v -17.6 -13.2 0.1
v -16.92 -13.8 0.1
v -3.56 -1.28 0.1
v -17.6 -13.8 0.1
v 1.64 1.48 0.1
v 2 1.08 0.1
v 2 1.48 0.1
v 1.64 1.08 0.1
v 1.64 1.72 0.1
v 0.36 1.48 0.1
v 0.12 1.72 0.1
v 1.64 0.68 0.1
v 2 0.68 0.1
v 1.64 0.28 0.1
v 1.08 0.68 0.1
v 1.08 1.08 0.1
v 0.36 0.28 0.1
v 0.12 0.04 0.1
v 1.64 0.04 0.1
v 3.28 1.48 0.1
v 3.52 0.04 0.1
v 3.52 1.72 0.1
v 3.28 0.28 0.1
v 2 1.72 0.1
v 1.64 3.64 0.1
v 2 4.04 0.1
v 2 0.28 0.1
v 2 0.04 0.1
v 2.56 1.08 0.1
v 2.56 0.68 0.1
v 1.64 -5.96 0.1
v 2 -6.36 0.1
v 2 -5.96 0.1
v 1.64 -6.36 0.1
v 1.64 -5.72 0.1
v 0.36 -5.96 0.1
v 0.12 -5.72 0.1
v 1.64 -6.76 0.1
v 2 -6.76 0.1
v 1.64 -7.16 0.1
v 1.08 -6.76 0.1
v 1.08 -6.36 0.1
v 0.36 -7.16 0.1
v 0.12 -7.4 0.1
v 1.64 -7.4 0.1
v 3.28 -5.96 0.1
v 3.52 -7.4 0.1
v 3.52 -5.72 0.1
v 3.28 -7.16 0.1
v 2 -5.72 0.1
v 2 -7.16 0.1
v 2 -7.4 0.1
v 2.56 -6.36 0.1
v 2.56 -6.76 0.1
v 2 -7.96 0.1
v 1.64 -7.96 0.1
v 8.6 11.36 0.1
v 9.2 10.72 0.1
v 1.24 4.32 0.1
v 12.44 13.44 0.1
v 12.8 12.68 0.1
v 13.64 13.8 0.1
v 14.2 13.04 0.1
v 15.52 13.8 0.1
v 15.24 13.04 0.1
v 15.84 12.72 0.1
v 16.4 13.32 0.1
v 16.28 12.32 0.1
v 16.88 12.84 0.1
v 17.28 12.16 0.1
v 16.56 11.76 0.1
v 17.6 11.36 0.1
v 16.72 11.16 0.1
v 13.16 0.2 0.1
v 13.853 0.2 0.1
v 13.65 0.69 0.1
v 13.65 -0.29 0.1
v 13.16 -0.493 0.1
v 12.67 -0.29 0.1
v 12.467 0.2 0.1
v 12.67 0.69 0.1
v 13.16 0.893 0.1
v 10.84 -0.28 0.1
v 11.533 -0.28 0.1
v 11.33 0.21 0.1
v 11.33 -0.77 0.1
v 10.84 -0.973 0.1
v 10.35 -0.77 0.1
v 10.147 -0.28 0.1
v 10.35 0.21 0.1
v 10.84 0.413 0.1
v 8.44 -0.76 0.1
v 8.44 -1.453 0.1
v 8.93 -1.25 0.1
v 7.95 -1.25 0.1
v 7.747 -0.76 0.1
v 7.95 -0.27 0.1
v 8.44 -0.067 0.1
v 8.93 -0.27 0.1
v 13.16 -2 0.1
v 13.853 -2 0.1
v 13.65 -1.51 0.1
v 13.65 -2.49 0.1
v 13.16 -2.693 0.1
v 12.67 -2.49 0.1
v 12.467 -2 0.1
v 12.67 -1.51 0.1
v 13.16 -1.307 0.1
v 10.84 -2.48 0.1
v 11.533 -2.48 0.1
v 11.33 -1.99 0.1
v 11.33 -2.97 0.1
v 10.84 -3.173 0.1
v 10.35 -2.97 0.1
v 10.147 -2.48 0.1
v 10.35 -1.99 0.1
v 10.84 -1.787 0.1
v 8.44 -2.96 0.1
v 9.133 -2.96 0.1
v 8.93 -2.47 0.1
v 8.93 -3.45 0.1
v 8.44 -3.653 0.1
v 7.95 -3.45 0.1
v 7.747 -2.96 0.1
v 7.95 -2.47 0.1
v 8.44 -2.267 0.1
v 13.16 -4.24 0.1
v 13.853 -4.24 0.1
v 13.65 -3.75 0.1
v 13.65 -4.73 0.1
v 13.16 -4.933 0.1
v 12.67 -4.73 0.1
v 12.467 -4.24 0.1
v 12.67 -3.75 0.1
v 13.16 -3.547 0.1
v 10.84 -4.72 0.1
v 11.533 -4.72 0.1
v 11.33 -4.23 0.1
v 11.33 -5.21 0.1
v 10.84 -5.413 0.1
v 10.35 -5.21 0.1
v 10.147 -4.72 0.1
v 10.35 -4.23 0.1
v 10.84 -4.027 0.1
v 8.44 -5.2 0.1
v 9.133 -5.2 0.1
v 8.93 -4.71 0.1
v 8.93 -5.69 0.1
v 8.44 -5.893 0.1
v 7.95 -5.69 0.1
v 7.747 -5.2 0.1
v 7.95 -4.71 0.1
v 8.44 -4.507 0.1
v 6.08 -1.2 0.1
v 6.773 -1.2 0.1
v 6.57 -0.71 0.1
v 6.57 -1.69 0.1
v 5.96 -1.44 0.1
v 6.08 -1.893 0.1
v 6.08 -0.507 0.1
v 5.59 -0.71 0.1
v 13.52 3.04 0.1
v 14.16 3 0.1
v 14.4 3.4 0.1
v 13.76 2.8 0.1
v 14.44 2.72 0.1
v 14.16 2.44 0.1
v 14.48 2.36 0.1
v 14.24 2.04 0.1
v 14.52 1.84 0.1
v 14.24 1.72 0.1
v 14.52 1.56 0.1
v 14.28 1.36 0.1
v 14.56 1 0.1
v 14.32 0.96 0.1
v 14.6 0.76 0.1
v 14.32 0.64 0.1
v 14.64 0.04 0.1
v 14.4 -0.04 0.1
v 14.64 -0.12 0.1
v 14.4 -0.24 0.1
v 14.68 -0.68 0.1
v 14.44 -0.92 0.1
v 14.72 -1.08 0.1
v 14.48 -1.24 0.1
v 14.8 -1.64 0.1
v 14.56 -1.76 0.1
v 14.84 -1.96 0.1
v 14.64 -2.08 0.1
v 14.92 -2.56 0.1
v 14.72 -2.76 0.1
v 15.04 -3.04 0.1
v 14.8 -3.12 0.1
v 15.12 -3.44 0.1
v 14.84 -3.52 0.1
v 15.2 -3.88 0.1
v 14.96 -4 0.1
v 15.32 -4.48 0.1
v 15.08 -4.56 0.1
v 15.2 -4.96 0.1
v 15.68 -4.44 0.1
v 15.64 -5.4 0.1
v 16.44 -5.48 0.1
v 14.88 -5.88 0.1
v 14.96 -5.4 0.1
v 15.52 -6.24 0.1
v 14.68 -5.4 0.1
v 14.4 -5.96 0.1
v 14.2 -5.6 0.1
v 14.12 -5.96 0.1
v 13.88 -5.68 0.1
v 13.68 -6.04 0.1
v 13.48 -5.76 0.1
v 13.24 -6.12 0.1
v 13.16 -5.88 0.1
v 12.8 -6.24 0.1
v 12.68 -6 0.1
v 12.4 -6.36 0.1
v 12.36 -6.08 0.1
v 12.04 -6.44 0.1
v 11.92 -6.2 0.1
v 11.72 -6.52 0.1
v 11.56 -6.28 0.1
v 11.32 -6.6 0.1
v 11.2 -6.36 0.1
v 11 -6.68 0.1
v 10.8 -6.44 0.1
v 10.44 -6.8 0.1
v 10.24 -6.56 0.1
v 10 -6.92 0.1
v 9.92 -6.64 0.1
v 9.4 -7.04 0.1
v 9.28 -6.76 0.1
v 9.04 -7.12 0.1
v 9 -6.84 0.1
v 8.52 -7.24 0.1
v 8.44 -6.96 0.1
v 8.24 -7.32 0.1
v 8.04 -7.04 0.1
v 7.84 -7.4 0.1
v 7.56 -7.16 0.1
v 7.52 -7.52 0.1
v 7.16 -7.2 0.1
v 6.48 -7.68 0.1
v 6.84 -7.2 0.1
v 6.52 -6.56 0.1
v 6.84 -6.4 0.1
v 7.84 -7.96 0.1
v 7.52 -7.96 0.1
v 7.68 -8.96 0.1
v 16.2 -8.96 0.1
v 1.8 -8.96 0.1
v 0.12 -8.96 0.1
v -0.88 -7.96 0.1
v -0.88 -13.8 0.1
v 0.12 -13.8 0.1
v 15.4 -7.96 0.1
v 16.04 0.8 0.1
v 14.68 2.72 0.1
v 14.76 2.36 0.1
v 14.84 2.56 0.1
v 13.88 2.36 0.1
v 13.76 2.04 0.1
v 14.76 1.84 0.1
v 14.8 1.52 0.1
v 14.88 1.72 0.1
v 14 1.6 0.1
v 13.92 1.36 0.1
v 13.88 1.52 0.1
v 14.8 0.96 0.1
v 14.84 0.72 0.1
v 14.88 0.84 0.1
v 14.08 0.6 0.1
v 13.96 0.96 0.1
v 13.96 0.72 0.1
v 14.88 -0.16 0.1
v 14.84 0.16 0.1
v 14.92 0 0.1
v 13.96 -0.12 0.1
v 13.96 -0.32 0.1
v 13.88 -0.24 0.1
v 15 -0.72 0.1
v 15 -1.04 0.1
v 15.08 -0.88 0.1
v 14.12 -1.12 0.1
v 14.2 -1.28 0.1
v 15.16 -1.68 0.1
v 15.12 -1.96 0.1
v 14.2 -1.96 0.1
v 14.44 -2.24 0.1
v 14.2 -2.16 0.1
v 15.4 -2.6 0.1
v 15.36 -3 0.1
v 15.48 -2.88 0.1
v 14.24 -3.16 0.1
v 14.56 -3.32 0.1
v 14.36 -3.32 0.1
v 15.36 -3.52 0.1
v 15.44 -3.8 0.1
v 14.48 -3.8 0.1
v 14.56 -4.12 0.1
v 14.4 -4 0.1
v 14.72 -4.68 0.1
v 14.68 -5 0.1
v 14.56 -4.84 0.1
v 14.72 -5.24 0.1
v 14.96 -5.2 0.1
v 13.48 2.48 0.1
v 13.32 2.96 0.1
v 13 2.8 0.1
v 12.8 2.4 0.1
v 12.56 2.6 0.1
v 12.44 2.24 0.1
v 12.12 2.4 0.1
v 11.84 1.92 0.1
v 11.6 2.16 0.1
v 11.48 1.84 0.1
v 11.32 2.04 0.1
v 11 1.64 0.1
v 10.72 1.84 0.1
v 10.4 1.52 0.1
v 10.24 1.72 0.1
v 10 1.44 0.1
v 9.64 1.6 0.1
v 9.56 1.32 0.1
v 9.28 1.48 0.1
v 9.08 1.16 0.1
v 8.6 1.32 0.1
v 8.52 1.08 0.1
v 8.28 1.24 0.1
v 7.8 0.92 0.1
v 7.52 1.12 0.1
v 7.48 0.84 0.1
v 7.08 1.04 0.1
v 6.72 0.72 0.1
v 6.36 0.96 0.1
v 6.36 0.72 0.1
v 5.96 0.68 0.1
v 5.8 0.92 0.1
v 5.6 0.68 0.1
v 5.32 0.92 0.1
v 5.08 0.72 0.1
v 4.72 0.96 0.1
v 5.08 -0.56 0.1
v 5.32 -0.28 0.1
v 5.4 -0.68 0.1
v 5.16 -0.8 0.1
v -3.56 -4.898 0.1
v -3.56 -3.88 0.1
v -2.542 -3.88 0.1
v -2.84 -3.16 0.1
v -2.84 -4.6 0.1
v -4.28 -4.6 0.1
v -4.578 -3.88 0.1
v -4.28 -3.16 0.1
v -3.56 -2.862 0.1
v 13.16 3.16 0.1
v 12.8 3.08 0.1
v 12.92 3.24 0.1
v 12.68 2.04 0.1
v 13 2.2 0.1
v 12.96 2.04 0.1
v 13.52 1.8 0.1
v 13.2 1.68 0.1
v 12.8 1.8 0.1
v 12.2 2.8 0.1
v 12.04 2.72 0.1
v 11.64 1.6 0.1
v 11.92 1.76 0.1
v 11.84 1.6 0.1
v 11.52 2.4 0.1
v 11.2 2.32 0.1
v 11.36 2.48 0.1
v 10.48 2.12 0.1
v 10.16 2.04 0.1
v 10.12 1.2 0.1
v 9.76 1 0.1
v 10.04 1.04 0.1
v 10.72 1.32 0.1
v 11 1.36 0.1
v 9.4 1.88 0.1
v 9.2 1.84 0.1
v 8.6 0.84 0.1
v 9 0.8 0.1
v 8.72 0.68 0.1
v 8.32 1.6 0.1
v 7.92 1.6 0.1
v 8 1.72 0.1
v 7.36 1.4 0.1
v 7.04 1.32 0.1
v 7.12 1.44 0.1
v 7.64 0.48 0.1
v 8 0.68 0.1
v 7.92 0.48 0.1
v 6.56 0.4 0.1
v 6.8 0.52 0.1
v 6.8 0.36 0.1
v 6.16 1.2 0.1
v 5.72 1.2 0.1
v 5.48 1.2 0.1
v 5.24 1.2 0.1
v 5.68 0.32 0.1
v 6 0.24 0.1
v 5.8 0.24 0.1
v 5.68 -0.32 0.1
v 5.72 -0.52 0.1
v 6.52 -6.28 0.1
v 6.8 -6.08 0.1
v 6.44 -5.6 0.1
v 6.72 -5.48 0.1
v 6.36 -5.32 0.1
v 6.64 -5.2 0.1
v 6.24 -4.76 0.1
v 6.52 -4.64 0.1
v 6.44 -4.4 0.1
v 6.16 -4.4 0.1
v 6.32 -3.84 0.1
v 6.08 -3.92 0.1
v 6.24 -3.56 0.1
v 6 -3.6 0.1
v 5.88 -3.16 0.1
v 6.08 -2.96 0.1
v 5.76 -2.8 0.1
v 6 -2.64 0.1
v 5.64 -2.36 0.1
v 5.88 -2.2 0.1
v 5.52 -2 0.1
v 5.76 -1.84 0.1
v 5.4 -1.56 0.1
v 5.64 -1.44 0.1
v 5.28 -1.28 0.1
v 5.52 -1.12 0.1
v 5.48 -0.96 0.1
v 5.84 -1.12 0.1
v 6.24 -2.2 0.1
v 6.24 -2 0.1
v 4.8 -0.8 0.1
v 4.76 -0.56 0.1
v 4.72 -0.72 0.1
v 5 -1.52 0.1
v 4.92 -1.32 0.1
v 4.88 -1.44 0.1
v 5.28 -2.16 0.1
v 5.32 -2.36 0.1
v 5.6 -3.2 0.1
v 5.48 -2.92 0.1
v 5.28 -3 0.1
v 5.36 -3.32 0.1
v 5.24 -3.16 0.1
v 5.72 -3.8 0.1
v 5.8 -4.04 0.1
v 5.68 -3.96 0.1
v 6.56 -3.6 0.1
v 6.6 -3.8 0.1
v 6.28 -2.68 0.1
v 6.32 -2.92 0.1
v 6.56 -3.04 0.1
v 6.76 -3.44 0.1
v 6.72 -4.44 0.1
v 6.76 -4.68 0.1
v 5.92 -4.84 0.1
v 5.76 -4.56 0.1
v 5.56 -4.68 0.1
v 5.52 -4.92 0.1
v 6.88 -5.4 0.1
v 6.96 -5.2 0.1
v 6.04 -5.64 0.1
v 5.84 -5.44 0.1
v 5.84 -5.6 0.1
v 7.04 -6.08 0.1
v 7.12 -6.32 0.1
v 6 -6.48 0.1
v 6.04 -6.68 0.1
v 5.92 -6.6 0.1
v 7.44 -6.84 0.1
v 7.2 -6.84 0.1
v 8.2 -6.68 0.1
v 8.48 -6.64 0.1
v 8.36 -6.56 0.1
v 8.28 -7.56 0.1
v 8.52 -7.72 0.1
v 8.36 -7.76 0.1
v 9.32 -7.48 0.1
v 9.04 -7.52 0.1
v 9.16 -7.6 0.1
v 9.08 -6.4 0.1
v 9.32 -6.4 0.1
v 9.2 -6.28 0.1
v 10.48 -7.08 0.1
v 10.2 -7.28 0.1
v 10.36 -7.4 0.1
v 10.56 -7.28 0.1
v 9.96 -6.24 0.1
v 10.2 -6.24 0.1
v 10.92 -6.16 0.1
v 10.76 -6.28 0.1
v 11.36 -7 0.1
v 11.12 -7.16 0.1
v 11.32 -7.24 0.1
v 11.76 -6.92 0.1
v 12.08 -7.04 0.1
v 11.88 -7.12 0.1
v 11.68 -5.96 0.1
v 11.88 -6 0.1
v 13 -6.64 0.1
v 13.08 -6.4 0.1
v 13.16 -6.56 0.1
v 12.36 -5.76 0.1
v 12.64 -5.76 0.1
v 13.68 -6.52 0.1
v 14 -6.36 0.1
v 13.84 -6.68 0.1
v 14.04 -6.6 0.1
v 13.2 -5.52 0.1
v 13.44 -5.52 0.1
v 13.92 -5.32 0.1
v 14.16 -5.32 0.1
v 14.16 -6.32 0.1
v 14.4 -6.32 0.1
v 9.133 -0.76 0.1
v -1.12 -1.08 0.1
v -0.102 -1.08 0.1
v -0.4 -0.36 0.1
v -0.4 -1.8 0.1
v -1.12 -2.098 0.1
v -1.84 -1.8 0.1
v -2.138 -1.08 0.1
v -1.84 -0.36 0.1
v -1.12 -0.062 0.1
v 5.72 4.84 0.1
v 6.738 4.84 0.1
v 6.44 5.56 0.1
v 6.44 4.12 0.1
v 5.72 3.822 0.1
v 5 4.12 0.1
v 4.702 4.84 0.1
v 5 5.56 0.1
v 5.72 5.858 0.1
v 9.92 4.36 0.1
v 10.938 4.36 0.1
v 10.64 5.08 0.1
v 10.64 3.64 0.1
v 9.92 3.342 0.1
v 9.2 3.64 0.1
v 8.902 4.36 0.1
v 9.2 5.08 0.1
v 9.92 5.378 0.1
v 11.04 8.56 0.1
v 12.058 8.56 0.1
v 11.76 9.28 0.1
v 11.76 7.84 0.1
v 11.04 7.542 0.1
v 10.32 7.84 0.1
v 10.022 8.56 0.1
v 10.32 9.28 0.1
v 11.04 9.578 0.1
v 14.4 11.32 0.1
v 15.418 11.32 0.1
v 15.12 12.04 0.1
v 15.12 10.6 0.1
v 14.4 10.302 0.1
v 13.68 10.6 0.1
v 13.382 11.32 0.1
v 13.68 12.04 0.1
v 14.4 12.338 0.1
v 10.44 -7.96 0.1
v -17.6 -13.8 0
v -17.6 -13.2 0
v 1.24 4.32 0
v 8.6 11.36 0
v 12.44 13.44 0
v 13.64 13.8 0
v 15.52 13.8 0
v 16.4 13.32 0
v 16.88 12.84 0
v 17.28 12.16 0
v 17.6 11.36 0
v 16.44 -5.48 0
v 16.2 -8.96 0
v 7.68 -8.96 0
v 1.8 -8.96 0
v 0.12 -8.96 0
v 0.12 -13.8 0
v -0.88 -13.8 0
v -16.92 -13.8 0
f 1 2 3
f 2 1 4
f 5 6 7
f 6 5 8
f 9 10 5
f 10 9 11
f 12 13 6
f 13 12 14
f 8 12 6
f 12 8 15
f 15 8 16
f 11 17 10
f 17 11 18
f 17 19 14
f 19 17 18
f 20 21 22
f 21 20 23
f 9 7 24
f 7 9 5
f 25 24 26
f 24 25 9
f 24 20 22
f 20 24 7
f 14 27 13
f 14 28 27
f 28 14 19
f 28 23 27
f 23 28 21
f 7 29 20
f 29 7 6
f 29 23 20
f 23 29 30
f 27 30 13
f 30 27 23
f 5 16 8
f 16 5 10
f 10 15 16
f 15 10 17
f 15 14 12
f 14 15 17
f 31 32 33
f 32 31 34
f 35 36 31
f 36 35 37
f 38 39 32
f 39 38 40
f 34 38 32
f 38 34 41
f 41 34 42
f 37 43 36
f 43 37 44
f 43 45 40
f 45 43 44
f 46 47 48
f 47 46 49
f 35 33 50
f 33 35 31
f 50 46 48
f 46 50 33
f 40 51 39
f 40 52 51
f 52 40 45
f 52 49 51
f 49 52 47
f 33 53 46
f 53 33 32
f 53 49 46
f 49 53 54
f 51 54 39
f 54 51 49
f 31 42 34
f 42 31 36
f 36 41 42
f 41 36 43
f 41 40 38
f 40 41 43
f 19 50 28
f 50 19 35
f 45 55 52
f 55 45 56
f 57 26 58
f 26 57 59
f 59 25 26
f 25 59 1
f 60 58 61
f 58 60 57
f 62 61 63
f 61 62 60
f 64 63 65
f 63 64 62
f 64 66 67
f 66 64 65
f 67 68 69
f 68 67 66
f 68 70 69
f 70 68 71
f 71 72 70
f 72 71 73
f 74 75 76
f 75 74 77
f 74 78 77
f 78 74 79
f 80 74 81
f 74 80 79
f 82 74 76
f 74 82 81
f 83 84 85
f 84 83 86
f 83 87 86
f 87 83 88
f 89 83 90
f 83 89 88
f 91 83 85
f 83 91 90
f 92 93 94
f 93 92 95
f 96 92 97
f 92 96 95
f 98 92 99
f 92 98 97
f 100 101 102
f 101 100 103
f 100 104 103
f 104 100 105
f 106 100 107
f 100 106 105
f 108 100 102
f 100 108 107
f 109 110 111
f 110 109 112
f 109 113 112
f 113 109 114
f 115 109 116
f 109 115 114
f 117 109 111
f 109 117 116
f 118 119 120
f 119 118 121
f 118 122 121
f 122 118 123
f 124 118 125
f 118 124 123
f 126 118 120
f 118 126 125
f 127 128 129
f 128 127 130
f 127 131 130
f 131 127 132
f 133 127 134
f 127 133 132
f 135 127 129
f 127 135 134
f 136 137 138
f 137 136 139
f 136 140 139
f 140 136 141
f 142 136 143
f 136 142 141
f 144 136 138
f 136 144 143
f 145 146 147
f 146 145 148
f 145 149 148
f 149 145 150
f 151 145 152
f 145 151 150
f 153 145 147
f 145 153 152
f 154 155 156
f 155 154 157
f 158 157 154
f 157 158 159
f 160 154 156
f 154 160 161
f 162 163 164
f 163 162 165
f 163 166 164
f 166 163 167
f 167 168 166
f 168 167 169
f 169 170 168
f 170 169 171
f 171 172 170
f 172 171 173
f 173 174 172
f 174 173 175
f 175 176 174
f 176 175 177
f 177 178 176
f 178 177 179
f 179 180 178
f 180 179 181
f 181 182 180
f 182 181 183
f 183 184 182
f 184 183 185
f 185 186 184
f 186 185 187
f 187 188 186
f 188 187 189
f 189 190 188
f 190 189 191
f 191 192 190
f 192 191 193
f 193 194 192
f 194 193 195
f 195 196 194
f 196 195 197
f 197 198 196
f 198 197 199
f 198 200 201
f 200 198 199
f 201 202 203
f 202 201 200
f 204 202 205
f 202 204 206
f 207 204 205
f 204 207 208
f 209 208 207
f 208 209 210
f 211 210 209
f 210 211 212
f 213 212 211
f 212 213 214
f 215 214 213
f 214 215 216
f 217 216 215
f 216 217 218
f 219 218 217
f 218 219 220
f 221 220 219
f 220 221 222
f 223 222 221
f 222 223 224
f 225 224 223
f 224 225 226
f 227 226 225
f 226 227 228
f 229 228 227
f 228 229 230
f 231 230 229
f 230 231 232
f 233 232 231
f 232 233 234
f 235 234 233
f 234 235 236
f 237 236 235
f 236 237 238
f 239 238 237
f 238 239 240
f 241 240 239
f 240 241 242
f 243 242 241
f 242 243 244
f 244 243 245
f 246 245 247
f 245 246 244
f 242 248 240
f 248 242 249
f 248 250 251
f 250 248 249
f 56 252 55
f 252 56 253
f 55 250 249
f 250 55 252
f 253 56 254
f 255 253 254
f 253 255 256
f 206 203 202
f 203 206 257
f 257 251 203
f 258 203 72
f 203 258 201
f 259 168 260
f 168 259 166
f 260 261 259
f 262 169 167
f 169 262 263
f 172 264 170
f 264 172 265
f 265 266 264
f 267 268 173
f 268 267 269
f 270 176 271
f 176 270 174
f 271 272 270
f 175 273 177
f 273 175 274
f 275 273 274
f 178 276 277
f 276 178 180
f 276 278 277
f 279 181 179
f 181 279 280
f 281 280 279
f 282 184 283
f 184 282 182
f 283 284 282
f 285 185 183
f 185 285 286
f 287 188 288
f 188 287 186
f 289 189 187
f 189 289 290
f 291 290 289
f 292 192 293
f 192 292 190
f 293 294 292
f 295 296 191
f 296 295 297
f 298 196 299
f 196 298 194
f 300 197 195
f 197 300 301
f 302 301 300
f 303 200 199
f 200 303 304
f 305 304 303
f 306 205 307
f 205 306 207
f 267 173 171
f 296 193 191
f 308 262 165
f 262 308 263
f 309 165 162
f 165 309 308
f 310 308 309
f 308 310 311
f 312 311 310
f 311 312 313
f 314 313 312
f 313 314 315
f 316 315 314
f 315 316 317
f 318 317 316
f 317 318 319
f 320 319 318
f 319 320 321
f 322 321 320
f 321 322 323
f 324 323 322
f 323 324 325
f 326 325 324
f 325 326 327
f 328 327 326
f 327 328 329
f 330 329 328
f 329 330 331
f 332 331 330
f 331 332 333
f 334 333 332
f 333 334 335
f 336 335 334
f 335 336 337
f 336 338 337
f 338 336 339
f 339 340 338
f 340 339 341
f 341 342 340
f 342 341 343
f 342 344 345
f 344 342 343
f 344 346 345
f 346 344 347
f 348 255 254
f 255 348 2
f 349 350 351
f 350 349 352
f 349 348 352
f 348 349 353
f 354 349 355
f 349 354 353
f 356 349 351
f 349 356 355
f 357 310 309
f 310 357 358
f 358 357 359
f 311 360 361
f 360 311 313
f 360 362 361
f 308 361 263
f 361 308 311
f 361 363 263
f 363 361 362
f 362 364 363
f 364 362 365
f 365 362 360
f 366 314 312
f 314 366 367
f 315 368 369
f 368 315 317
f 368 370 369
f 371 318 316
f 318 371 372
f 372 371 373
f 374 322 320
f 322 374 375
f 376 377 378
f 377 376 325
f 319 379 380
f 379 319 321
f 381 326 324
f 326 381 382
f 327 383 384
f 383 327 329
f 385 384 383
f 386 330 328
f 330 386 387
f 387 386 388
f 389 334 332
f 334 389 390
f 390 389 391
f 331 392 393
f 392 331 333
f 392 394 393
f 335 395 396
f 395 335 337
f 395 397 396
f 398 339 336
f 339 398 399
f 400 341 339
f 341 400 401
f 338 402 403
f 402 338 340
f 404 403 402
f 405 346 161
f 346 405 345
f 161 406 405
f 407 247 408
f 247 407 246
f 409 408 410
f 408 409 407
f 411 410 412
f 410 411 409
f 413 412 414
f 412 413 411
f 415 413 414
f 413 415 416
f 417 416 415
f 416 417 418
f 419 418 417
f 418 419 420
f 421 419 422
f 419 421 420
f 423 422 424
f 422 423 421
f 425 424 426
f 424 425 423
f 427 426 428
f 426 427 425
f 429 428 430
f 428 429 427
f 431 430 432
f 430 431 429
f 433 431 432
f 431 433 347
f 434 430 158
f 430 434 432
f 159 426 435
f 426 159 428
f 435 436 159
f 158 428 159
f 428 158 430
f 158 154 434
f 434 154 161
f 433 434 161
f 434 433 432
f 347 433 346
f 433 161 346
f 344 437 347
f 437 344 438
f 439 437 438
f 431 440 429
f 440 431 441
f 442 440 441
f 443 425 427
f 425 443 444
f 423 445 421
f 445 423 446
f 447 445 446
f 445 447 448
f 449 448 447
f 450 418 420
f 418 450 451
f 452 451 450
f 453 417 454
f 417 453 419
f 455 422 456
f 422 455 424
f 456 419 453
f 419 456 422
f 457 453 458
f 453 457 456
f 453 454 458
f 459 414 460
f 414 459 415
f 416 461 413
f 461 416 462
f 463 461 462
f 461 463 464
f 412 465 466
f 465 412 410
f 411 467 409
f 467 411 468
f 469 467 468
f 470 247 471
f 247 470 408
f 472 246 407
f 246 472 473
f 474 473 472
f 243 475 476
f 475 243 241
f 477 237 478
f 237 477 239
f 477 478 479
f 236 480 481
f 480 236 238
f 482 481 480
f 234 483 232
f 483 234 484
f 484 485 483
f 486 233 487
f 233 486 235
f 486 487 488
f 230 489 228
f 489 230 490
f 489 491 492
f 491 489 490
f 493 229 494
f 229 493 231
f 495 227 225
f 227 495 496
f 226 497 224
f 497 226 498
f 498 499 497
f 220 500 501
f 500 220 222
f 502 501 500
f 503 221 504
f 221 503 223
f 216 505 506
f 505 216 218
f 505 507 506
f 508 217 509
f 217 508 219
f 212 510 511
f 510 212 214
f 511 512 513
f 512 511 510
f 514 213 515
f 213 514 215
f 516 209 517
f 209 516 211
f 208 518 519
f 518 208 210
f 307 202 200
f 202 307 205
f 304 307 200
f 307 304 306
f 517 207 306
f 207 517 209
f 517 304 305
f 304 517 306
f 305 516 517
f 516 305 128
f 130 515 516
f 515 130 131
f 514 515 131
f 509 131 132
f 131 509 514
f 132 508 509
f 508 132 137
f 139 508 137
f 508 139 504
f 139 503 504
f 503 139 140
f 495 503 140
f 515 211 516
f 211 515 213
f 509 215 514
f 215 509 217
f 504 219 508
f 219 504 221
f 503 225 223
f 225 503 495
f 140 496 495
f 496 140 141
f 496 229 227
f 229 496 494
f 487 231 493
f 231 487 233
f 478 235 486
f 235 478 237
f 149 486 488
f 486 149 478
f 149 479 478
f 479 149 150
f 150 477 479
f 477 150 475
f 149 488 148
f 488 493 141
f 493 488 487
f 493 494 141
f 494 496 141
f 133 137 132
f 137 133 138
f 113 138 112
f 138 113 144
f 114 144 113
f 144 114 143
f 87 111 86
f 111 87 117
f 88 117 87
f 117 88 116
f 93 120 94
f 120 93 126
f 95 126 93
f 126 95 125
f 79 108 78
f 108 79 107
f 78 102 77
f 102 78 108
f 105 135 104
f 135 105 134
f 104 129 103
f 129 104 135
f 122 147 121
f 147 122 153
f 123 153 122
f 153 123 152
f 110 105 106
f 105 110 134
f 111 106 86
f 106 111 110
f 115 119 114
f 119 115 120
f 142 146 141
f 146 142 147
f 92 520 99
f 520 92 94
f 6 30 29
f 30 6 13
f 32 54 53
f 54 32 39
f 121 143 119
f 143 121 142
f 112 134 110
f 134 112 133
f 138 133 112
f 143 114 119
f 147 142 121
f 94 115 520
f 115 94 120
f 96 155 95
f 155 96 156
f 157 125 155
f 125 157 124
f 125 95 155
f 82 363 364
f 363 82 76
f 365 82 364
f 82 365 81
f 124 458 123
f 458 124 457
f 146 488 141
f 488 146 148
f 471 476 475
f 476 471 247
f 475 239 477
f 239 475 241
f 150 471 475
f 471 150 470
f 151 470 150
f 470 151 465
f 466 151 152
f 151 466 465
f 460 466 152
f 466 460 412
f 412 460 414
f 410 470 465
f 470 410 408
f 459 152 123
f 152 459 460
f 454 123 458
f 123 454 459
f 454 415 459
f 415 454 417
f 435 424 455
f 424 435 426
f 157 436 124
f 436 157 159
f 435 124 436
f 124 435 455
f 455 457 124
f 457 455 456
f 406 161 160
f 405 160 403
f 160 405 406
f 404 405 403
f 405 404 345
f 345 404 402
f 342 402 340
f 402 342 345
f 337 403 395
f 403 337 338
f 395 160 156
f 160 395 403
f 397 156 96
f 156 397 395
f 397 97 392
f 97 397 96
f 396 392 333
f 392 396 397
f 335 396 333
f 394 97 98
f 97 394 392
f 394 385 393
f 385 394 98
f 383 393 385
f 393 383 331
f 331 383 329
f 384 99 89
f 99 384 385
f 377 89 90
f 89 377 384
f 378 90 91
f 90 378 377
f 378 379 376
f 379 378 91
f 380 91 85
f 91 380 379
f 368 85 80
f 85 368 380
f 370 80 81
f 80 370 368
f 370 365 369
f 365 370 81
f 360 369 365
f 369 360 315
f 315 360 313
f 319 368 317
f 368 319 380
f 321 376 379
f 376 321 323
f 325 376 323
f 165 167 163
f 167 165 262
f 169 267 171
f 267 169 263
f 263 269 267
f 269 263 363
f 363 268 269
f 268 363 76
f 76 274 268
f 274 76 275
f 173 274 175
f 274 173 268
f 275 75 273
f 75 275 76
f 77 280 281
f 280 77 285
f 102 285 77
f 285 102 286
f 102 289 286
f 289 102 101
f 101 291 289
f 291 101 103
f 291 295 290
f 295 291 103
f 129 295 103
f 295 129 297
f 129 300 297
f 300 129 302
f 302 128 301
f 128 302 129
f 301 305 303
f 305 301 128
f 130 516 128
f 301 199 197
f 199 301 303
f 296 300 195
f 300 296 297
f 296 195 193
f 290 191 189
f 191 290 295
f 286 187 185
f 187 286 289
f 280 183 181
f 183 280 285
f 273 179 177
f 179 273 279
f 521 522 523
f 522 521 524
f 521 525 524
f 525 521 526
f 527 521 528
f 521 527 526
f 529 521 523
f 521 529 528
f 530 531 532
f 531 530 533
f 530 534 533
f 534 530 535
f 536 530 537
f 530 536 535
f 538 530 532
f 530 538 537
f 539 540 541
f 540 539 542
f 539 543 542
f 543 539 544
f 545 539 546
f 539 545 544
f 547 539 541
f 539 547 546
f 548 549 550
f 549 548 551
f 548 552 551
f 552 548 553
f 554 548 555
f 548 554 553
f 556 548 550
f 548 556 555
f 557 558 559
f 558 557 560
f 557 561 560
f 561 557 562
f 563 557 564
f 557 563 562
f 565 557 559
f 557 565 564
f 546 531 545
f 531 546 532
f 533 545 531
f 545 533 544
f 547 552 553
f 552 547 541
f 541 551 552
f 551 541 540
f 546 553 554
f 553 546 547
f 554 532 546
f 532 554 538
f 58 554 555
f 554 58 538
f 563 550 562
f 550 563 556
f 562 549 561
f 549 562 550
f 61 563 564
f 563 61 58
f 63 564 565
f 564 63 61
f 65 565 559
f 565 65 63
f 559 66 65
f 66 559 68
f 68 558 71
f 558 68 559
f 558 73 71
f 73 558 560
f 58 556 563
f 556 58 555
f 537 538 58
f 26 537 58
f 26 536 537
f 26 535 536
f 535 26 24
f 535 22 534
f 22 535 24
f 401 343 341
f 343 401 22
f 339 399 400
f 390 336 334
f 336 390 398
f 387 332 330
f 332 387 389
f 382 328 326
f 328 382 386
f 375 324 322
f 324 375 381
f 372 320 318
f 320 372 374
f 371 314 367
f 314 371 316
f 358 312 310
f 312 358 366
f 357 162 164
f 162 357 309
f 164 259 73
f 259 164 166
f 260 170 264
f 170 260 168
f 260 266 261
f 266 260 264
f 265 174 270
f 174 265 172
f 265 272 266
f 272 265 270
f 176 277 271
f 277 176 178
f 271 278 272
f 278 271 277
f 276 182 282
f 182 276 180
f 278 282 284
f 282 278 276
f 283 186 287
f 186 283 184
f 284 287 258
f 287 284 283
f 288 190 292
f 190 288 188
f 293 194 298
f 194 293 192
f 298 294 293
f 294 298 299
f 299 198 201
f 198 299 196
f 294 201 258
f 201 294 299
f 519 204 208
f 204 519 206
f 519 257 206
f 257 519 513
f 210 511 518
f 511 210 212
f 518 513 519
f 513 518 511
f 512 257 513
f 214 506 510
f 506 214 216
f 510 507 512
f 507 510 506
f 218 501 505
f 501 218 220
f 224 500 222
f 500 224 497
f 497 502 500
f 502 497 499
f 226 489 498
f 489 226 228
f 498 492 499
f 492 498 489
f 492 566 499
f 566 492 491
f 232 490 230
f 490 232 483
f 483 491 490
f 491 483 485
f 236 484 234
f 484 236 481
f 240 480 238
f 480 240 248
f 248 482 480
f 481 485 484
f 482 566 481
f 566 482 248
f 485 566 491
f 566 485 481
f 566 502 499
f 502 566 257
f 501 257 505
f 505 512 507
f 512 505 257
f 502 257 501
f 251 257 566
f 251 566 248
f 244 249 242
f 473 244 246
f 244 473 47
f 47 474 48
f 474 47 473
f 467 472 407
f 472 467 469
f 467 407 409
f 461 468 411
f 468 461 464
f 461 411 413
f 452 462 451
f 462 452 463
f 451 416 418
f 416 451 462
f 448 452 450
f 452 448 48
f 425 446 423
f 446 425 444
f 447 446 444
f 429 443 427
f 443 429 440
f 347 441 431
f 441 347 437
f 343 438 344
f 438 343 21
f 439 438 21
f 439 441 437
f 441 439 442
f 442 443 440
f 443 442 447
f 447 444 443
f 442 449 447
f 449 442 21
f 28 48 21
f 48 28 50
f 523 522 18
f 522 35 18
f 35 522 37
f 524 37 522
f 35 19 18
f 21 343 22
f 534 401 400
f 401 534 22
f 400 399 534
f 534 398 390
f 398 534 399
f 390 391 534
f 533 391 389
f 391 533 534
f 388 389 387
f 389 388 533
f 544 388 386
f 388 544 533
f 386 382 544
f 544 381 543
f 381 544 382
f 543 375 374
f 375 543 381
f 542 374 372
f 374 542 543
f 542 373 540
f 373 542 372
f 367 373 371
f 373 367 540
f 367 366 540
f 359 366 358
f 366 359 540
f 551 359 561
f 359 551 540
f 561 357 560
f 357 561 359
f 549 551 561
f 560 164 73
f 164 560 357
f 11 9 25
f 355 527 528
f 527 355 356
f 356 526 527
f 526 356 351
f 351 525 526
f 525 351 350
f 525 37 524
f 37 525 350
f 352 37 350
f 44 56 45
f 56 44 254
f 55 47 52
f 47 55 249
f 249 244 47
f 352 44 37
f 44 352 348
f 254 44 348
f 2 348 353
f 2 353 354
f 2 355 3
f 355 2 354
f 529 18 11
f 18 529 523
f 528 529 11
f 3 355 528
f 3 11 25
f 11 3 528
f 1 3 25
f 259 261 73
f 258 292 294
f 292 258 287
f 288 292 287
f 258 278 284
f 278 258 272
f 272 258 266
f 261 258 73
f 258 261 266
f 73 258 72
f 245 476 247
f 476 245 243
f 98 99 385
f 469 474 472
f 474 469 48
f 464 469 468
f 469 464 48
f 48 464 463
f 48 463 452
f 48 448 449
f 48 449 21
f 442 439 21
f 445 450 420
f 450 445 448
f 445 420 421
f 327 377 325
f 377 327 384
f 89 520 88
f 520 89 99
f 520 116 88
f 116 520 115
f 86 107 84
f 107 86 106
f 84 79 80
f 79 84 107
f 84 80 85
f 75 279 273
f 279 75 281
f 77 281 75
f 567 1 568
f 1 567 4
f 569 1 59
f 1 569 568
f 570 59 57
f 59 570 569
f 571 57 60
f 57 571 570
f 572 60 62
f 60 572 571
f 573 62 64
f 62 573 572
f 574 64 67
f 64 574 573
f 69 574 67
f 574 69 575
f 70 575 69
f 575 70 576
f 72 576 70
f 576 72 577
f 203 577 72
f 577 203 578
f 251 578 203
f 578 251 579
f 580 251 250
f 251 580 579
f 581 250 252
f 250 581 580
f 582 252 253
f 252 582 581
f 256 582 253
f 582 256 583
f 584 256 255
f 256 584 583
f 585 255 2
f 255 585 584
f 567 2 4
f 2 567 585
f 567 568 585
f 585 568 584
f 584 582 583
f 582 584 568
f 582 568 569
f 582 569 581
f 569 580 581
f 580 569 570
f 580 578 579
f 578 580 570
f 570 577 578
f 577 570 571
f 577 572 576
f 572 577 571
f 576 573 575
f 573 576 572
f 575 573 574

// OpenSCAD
use <../lib.scad>
use <4114141c.scad>
$fa=1; $fs=0.2;
function ldraw_lib__4114141d(realsolid=false) = [
// 0 Sticker  3.4 x  4.4 with Black Lines & Patched Cloth Side B
// 0 Name: 4114141d.dat
// 0 Author: Merlijn Wissink [legolijntje]
// 0 !LDRAW_ORG Part UPDATE 2016-01
// 0 !LICENSE Licensed under CC BY 2.0 and CC BY 4.0 : see CAreadme.txt
// 
// 0 BFC CERTIFY CCW
  [0,"BFC","CERTIFY"],
  [0,"BFC","CCW"],
// 
// 0 !KEYWORDS set 2879, set 5909, set 5948
// 
// 0 !HISTORY 2016-12-31 [PTadmin] Official Update 2016-01
// 
// 
// 1 16 0 0 0 -1 0 0 0 1 0 0 0 1 4114141c.dat
  [1,16,0,0,0,-1,0,0,0,1,0,0,0,1, ldraw_lib__4114141c(realsolid)],
];
module ldraw_lib__4114141d(step=0, col=false, unit=2/5, alt=false, line=0.2, solid=!$preview)
    makepoly(ldraw_lib__4114141d(solid), step=step, col=col, unit=unit, alt=alt, line=line, solid=solid);
ldraw_lib__4114141d(line=0.2);
